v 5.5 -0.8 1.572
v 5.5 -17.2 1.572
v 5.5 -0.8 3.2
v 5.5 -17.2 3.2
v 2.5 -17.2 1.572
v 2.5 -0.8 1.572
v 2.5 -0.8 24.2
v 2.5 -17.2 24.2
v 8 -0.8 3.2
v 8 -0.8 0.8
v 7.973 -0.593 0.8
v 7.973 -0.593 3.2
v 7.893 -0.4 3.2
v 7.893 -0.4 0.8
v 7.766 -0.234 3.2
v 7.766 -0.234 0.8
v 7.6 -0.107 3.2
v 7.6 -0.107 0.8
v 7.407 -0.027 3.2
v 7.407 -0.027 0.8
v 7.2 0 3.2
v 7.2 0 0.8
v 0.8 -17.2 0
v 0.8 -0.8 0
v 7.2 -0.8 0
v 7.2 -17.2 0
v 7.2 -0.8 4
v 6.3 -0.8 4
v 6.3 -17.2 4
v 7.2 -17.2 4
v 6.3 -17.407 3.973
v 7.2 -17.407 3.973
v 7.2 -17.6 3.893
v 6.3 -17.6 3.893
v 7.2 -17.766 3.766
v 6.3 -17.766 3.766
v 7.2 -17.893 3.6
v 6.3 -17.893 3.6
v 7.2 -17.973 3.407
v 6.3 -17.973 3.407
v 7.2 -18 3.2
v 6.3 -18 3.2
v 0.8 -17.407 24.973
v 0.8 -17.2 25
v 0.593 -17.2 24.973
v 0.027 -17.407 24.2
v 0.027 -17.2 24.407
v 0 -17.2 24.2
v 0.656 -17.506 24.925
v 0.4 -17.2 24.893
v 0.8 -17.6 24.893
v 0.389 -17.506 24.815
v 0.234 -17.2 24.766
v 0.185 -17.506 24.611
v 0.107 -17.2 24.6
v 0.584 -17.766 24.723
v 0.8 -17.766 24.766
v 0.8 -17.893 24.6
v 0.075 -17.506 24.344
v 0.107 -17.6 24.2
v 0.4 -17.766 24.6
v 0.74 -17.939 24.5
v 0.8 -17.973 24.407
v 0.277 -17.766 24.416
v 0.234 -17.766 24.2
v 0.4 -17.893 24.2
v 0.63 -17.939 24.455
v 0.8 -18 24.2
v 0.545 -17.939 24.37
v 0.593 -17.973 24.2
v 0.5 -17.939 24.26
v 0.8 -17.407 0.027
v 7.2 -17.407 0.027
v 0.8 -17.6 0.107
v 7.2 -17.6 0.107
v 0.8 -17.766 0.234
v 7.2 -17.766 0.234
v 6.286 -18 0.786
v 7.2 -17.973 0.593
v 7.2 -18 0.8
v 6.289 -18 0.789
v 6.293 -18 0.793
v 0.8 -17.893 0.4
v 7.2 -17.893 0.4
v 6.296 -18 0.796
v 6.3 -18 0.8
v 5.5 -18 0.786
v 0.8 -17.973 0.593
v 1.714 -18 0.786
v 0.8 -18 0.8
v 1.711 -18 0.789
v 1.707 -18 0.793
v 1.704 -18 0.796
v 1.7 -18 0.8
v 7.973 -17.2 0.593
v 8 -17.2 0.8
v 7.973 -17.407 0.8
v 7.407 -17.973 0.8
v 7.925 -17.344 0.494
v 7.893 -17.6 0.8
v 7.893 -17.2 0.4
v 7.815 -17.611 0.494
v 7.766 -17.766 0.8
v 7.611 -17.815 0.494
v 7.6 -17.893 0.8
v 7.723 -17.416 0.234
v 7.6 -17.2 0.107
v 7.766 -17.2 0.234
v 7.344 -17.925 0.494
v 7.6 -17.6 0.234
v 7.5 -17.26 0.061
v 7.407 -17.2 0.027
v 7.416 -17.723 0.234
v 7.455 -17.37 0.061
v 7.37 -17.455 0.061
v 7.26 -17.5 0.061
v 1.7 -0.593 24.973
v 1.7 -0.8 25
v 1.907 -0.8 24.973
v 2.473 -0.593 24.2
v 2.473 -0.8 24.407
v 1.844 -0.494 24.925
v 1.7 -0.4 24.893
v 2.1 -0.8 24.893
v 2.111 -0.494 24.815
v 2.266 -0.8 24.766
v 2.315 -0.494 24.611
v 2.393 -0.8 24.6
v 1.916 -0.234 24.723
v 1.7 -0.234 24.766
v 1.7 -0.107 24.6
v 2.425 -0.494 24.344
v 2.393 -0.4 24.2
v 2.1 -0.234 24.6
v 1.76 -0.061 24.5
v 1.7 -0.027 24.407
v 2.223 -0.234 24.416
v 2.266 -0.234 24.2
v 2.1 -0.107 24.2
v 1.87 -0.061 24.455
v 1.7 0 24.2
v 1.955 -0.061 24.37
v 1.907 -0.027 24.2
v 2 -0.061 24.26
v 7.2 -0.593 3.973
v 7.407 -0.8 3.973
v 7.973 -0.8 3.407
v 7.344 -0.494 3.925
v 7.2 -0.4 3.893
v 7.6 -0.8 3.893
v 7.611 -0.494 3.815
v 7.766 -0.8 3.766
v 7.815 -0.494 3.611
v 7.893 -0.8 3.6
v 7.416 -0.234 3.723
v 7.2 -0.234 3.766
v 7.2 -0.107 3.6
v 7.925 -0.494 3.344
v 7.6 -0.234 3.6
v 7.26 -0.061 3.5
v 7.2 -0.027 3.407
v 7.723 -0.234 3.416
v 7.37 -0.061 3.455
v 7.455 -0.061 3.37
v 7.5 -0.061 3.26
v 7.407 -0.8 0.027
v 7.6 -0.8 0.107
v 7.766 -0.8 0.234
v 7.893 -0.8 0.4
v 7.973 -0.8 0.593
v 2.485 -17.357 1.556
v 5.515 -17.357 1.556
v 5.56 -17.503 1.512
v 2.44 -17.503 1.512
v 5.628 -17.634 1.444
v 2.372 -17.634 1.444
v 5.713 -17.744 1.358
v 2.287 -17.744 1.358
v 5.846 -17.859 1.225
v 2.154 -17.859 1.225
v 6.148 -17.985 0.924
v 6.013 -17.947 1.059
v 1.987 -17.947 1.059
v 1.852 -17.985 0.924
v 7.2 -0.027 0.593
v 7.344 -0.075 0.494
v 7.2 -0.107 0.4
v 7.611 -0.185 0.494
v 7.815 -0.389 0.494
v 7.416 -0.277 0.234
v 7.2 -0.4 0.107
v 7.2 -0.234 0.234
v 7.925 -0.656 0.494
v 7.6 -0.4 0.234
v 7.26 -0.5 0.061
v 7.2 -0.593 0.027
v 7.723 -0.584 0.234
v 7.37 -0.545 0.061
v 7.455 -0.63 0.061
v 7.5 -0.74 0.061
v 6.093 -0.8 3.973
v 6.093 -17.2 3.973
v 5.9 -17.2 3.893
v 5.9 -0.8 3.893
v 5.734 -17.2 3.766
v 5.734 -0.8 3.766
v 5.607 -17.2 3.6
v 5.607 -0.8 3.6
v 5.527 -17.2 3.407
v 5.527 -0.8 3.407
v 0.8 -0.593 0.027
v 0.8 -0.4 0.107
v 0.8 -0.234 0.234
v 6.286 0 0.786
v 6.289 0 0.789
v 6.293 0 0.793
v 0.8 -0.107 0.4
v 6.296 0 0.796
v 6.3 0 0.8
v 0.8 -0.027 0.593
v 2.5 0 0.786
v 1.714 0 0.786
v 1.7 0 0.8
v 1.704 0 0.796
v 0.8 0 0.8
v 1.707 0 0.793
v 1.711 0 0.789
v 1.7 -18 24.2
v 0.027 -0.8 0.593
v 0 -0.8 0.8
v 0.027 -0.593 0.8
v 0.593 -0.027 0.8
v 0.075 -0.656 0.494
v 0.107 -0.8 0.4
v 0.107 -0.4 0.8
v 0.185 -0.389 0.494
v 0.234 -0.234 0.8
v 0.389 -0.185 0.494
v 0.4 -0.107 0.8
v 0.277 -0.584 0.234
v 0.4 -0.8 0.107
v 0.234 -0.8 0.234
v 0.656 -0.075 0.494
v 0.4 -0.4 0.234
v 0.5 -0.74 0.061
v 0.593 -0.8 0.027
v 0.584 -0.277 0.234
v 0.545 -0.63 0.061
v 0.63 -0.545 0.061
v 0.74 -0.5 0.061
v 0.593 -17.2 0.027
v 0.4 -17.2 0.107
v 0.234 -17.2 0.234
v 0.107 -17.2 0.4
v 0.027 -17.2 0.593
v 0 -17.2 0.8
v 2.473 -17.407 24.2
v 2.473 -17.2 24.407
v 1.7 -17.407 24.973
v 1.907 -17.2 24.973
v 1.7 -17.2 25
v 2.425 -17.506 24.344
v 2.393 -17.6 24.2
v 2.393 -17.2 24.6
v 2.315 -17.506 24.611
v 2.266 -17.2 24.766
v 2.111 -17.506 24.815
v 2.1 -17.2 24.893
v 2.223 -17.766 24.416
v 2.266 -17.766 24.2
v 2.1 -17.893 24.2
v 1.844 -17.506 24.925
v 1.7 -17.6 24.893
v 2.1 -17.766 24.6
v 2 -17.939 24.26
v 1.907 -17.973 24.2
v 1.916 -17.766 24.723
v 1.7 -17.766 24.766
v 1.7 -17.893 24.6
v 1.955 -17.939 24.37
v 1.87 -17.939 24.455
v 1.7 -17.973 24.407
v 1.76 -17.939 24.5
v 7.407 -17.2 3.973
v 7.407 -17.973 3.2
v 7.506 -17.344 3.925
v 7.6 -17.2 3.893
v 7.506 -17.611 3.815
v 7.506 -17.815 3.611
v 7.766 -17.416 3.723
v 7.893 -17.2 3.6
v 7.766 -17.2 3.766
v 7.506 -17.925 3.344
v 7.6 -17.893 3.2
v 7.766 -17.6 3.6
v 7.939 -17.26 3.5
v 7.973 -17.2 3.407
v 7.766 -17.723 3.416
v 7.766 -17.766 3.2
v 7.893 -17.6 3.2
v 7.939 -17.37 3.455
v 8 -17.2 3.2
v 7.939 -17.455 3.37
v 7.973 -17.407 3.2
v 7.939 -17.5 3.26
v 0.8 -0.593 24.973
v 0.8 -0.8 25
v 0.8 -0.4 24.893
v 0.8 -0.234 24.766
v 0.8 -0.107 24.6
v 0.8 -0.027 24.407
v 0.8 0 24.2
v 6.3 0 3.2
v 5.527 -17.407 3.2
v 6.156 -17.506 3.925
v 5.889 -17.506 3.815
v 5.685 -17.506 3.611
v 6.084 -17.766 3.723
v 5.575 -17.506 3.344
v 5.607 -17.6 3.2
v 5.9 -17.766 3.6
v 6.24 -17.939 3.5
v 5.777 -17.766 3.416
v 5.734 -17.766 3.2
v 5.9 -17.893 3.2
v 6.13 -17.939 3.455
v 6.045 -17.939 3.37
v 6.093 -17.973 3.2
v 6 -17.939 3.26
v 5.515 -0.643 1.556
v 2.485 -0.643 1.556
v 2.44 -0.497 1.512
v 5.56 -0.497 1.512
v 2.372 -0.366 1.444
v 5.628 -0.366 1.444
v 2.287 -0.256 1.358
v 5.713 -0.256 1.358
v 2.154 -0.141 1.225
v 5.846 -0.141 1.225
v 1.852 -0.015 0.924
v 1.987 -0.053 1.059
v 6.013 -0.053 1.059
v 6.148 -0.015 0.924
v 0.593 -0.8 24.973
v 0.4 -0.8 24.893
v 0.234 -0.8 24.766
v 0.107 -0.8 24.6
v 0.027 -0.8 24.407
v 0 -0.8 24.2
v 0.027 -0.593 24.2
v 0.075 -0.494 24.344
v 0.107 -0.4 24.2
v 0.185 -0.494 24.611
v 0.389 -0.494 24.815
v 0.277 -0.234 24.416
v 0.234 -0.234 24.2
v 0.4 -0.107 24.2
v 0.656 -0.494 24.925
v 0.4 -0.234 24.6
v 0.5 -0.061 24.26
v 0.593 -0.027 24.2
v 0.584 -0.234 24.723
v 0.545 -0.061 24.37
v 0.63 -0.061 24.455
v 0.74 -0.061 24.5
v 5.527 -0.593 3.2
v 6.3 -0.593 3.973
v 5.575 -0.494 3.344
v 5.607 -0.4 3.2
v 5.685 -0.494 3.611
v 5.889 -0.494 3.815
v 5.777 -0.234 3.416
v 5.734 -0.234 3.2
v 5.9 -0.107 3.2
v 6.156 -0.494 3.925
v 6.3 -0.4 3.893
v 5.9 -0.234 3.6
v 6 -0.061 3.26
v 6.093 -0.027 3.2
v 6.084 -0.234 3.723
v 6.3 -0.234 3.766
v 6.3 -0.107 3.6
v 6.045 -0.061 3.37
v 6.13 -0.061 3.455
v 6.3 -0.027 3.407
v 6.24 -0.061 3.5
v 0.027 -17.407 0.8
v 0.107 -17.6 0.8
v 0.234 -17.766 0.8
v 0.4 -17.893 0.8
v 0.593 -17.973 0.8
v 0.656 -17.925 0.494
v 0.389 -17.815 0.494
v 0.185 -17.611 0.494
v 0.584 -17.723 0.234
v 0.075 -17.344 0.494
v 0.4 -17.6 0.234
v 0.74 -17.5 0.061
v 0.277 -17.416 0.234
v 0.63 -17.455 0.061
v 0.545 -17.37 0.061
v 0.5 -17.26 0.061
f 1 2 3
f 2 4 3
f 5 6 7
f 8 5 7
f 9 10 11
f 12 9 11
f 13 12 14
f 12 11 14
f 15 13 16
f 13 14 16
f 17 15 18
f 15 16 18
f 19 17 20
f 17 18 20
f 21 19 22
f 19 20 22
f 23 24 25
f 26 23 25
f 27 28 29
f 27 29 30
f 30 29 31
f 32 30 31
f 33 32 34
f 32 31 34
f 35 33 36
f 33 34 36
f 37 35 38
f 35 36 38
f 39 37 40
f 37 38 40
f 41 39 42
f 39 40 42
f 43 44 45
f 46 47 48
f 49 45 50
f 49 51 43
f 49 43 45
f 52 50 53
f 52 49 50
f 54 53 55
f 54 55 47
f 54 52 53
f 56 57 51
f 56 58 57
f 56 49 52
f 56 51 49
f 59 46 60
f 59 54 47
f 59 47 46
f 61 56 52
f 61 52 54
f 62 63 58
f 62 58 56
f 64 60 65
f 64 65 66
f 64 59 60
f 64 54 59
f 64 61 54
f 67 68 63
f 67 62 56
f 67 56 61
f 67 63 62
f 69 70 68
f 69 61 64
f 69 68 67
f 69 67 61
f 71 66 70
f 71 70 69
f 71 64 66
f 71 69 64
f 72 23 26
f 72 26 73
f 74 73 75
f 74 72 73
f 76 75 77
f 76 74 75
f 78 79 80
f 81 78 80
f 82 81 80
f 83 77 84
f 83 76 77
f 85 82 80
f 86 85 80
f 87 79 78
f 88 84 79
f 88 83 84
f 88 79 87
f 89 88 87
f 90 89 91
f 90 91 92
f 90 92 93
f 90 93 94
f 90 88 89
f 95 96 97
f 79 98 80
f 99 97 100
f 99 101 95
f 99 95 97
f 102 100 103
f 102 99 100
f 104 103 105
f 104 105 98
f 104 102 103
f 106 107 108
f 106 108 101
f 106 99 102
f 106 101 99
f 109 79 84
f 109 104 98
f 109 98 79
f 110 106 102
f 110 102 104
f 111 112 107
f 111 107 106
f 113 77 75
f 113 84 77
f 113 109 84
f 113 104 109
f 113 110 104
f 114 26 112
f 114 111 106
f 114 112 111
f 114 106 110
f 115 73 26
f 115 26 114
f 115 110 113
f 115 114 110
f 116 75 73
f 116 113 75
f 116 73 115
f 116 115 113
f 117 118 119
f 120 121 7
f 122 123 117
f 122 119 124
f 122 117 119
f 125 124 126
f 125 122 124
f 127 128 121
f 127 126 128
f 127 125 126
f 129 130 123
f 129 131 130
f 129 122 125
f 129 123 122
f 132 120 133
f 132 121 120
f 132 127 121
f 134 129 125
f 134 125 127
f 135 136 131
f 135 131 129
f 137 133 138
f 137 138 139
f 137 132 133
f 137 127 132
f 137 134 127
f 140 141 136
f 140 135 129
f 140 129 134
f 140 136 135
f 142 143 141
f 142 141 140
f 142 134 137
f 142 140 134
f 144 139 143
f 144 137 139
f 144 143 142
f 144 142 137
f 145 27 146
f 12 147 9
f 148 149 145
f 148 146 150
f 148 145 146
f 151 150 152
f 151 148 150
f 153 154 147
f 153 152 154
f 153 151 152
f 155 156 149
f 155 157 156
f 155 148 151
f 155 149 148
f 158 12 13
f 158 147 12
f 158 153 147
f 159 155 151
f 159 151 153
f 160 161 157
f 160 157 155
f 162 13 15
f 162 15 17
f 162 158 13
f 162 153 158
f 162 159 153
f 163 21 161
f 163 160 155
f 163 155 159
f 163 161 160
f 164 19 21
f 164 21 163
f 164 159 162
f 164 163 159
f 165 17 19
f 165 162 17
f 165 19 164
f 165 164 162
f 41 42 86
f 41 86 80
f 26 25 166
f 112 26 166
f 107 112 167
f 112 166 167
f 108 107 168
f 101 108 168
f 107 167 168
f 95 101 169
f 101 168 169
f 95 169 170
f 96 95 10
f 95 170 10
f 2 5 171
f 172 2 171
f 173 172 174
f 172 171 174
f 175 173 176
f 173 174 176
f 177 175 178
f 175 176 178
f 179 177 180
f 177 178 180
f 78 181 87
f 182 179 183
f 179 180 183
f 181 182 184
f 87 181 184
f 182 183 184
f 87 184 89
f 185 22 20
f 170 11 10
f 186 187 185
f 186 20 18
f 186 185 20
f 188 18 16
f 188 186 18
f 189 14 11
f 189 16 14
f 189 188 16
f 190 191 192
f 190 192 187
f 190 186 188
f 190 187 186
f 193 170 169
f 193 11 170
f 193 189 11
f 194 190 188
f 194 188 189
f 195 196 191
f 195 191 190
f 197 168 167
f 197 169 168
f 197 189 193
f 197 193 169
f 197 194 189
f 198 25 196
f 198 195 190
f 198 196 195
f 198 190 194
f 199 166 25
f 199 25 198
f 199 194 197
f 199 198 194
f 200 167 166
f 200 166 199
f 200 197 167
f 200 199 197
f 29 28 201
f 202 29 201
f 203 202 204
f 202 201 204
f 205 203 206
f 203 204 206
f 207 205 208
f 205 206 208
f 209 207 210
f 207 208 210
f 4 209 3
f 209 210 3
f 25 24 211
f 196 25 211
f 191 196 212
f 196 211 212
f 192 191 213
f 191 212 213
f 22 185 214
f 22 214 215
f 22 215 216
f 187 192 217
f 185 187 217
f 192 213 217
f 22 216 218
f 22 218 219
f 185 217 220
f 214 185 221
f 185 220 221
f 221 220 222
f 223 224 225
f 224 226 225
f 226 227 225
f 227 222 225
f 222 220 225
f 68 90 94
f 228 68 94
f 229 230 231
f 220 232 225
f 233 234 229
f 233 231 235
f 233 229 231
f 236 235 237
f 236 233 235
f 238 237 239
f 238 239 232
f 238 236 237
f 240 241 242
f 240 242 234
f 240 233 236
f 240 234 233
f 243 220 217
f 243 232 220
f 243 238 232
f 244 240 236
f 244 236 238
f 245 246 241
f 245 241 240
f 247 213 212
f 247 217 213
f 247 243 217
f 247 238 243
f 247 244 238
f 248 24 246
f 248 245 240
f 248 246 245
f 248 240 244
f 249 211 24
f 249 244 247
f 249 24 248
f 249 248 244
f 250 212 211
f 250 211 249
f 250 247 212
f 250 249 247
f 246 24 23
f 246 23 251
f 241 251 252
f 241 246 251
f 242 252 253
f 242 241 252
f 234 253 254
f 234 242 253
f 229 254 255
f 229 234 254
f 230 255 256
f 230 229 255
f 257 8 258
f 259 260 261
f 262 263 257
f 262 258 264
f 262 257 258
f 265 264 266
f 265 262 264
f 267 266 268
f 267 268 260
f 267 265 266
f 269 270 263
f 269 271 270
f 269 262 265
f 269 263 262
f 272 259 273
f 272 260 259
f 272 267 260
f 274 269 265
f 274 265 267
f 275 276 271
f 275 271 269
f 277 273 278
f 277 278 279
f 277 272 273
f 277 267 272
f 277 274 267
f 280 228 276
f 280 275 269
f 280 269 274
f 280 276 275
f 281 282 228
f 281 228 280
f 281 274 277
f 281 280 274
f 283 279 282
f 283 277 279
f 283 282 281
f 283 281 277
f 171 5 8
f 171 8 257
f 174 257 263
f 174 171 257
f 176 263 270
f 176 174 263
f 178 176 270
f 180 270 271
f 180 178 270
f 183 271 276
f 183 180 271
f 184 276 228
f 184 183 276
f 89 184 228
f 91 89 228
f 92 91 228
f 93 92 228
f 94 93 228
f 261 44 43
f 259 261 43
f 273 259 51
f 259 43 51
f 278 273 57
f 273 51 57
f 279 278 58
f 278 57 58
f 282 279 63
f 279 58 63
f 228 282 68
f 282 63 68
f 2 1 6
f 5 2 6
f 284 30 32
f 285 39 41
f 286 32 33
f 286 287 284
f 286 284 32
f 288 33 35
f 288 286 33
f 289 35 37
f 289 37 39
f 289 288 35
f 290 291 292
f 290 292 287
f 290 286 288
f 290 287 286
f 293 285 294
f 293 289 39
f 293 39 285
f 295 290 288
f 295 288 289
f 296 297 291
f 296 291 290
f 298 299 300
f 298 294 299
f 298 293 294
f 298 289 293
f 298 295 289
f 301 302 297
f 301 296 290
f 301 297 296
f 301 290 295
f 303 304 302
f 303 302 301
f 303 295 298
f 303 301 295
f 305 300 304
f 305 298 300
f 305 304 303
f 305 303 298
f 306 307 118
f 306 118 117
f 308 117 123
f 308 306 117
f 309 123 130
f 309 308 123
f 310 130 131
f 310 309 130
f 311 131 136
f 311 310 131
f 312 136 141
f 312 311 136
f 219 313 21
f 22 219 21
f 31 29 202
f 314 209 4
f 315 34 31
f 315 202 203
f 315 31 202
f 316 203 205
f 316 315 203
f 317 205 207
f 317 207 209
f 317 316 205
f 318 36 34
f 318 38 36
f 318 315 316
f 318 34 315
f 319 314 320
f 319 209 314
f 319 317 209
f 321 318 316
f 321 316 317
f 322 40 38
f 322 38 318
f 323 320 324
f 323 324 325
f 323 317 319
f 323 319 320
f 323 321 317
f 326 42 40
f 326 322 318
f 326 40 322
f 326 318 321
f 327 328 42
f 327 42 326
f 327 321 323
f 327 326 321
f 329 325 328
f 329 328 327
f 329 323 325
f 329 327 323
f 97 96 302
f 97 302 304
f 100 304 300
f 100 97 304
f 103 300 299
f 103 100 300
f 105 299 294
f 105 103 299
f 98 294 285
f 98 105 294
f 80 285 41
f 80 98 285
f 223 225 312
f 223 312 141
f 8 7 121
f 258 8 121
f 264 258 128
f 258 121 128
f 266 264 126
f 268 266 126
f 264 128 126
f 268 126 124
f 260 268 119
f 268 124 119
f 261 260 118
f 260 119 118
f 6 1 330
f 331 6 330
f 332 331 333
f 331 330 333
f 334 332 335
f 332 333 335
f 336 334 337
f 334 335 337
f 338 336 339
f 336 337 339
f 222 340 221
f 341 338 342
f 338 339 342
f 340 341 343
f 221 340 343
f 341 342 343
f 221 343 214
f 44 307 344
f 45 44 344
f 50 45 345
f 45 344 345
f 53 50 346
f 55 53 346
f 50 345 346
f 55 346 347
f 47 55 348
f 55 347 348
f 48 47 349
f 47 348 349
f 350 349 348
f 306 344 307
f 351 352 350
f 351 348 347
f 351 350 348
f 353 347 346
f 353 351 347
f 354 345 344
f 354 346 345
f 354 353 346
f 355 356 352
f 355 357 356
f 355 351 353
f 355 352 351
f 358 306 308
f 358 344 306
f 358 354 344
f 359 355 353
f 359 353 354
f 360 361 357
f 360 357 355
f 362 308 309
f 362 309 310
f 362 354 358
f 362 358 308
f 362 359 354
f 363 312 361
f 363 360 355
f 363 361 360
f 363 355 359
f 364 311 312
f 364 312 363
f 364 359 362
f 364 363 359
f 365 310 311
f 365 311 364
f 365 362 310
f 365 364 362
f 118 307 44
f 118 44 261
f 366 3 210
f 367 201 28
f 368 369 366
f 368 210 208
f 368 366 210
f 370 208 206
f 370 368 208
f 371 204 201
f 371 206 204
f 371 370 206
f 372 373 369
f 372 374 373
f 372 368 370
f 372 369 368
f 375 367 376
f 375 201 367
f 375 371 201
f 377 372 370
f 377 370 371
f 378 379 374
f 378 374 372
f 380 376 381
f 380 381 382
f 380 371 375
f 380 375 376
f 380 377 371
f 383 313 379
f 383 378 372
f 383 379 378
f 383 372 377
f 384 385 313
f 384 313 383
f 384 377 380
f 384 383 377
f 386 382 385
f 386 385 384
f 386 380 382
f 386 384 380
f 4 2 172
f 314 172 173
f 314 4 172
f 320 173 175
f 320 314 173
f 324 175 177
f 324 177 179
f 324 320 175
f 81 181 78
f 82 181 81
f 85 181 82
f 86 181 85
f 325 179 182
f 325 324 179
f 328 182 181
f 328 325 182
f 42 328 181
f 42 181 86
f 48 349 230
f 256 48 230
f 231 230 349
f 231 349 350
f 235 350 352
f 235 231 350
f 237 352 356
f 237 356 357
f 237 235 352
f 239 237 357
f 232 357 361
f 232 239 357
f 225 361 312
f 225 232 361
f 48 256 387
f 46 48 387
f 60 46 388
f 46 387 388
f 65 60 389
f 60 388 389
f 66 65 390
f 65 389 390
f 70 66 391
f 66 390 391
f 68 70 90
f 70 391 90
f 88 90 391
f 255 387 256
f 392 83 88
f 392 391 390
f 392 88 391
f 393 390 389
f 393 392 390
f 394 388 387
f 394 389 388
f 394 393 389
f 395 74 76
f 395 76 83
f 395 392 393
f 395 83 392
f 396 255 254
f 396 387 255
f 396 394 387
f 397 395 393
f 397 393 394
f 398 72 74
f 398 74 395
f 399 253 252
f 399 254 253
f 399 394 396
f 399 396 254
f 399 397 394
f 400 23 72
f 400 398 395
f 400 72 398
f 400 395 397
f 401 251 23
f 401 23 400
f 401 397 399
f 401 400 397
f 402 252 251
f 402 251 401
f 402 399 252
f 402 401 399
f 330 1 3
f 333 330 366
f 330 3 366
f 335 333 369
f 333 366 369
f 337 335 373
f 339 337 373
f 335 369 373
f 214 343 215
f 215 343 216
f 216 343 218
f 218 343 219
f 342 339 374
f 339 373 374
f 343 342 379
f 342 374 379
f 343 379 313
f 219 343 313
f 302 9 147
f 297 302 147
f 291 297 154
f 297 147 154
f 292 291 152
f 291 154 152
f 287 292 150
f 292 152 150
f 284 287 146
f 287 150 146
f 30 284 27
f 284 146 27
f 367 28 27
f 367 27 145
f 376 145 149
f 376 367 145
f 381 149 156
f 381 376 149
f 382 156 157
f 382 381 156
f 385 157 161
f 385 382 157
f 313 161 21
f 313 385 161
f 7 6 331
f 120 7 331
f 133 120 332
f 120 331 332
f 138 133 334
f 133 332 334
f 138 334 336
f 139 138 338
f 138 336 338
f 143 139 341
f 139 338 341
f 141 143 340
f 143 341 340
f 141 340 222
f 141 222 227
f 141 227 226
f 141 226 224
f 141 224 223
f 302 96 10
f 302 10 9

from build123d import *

# Parameters (mm, degrees)
F0_W          = 2.5
F0_H          = 1.5716314532
F0_W_2        = 3
F0_H_2        = 23.4283685468
F0_H_3        = 2.4283685468
F1_DEPTH      = 18
F2_T1_DEPTH   = 16.4
F2_T3_DEPTH   = 22.6283685468
F2_T5_DEPTH   = 3
F2_T7_DEPTH   = 1.6283685468
F2_T9_DEPTH   = 0.9
F2_T11_DEPTH  = 2.4
F2_T13_DEPTH  = 6.4
F2_T15_DEPTH  = 23.4
F2_T17_DEPTH  = 0.9
F2_S21_W      = 0.8
F2_S21_H      = 0.8
F2_T22_DEPTH  = 0.8
F2_S27_W      = 0.8
F2_S27_H      = 0.8
F2_T28_DEPTH  = 0.8
F2_S33_W      = 0.8
F2_S33_H      = 0.8
F2_T34_DEPTH  = 0.8
F2_S39_W      = 0.8
F2_S39_H      = 0.8
F2_T40_DEPTH  = 0.8
F2_S45_W      = 0.8
F2_S45_H      = 0.8
F2_T46_DEPTH  = 0.8
F2_S51_W      = 0.8
F2_S51_H      = 0.8
F2_T52_DEPTH  = 0.8
F2_S57_W      = 0.8
F2_S57_H      = 0.8
F2_T58_DEPTH  = 0.8
F2_S63_W      = 0.8
F2_S63_H      = 0.8
F2_T64_DEPTH  = 0.8
F2_S69_W      = 0.8
F2_S69_H      = 0.8
F2_T70_DEPTH  = 0.8
F2_S75_W      = 0.8
F2_S75_H      = 0.8
F2_T76_DEPTH  = 0.8
F2_S81_W      = 0.8
F2_S81_H      = 0.8
F2_T82_DEPTH  = 0.8
F2_S87_W      = 0.8
F2_S87_H      = 0.8
F2_T88_DEPTH  = 0.8
F2_T95_DEPTH  = 5
F2_T99_DEPTH  = 24.6283685468
F2_T106_DEPTH = 3.6283685468
F2_T110_DEPTH = 5
F2_T117_DEPTH = 3.6283685468
F2_T121_DEPTH = 5
F2_T128_DEPTH = 5
F2_T132_DEPTH = 24.6283685468


# Not quite as in the source:
# - a fillet or chamfer that OpenCascade refuses, or shapes differently, is made with other operations: its cross-section is extruded or revolved along the edge and cut away or added


with BuildPart() as f1:
    # F0 (on Front) → F1 (new body)
    with BuildSketch(Plane.XZ):
        with Locations((1.25, 0.7858157266)):
            Rectangle(F0_W, F0_H)
        with Locations((4, 0.7858157266)):
            Rectangle(F0_W_2, F0_H)
        with Locations((1.25, 13.2858157266)):
            Rectangle(F0_W, F0_H_2)
        with Locations((6.75, 0.7858157266)):
            Rectangle(F0_W, F0_H)
        with Locations((6.75, 2.7858157266)):
            Rectangle(F0_W, F0_H_3)
    extrude(amount=F1_DEPTH)

    # F2: fillet of radius 0.8 on 22 edges, made by hand

    # F2_s2 → F2_t1 (cut)
    with BuildSketch(Plane.XZ.offset(0.8)):
        with BuildLine():
            ThreePointArc((8, 3.2), (7.7656854249, 3.7656854249), (7.2, 4))
            Line((7.2, 4), (8, 4))
            Line((8, 4), (8, 3.2))
        make_face()
        with BuildLine():
            ThreePointArc((7.2, 0), (7.7656854249, 0.2343145751), (8, 0.8))
            Line((8, 0.8), (8, 0))
            Line((8, 0), (7.2, 0))
        make_face()
        with BuildLine():
            ThreePointArc((6.3, 4), (5.7343145751, 3.7656854249), (5.5, 3.2))
            Line((5.5, 3.2), (5.5, 4))
            Line((5.5, 4), (6.3, 4))
        make_face()
        with BuildLine():
            ThreePointArc((2.5, 24.2), (2.2656854249, 24.7656854249), (1.7, 25))
            Line((1.7, 25), (2.5, 25))
            Line((2.5, 25), (2.5, 24.2))
        make_face()
        with BuildLine():
            ThreePointArc((0.8, 25), (0.2343145751, 24.7656854249), (0, 24.2))
            Line((0, 24.2), (0, 25))
            Line((0, 25), (0.8, 25))
        make_face()
        with BuildLine():
            ThreePointArc((0.8, 0), (0.2343145751, 0.2343145751), (0, 0.8))
            Line((0, 0.8), (0, 0))
            Line((0, 0), (0.8, 0))
        make_face()
    extrude(amount=F2_T1_DEPTH, mode=Mode.SUBTRACT)

    # F2_s4 → F2_t3 (cut)
    with BuildSketch(Plane.XY.offset(1.5716314532)):
        with BuildLine():
            ThreePointArc((2.5, -17.2), (2.2656854249, -17.7656854249), (1.7, -18))
            Line((1.7, -18), (2.5, -18))
            Line((2.5, -18), (2.5, -17.2))
        make_face()
        with BuildLine():
            ThreePointArc((2.5, -0.8), (2.2656854249, -0.2343145751), (1.7, 0))
            Line((1.7, 0), (2.5, 0))
            Line((2.5, 0), (2.5, -0.8))
        make_face()
    extrude(amount=F2_T3_DEPTH, mode=Mode.SUBTRACT)

    # F2_s6 → F2_t5 (cut)
    with BuildSketch(Plane.YZ.offset(2.5)):
        with BuildLine():
            ThreePointArc((-17.2, 1.5716314532), (-17.7656854249, 1.3373168782), (-18, 0.7716314532))
            Line((-18, 0.7716314532), (-18, 1.5716314532))
            Line((-18, 1.5716314532), (-17.2, 1.5716314532))
        make_face()
        with BuildLine():
            ThreePointArc((-0.8, 1.5716314532), (-0.2343145751, 1.3373168782), (0, 0.7716314532))
            Line((0, 0.7716314532), (0, 1.5716314532))
            Line((0, 1.5716314532), (-0.8, 1.5716314532))
        make_face()
    extrude(amount=F2_T5_DEPTH, mode=Mode.SUBTRACT)

    # F2_s8 → F2_t7 (cut)
    with BuildSketch(Plane.XY.offset(1.5716314532)):
        with BuildLine():
            ThreePointArc((5.5, -17.2), (5.7343145751, -17.7656854249), (6.3, -18))
            Line((6.3, -18), (5.5, -18))
            Line((5.5, -18), (5.5, -17.2))
        make_face()
        with BuildLine():
            ThreePointArc((5.5, -0.8), (5.7343145751, -0.2343145751), (6.3, 0))
            Line((6.3, 0), (5.5, 0))
            Line((5.5, 0), (5.5, -0.8))
        make_face()
    extrude(amount=F2_T7_DEPTH, mode=Mode.SUBTRACT)

    # F2_s10 → F2_t9 (cut)
    with BuildSketch(Plane.YZ.offset(6.3)):
        with BuildLine():
            ThreePointArc((-17.2, 4), (-17.7656854249, 3.7656854249), (-18, 3.2))
            Line((-18, 3.2), (-18, 4))
            Line((-18, 4), (-17.2, 4))
        make_face()
        with BuildLine():
            ThreePointArc((-0.8, 4), (-0.2343145751, 3.7656854249), (0, 3.2))
            Line((0, 3.2), (0, 4))
            Line((0, 4), (-0.8, 4))
        make_face()
    extrude(amount=F2_T9_DEPTH, mode=Mode.SUBTRACT)

    # F2_s12 → F2_t11 (cut)
    with BuildSketch(Plane.XY.offset(0.8)):
        with BuildLine():
            ThreePointArc((8, -17.2), (7.7656854249, -17.7656854249), (7.2, -18))
            Line((7.2, -18), (8, -18))
            Line((8, -18), (8, -17.2))
        make_face()
        with BuildLine():
            ThreePointArc((8, -0.8), (7.7656854249, -0.2343145751), (7.2, 0))
            Line((7.2, 0), (8, 0))
            Line((8, 0), (8, -0.8))
        make_face()
    extrude(amount=F2_T11_DEPTH, mode=Mode.SUBTRACT)

    # F2_s14 → F2_t13 (cut)
    with BuildSketch(Plane.YZ.offset(0.8)):
        with BuildLine():
            ThreePointArc((-17.2, 0), (-17.7656854249, 0.2343145751), (-18, 0.8))
            Line((-18, 0.8), (-18, 0))
            Line((-18, 0), (-17.2, 0))
        make_face()
        with BuildLine():
            ThreePointArc((-0.8, 0), (-0.2343145751, 0.2343145751), (0, 0.8))
            Line((0, 0.8), (0, 0))
            Line((0, 0), (-0.8, 0))
        make_face()
    extrude(amount=F2_T13_DEPTH, mode=Mode.SUBTRACT)

    # F2_s16 → F2_t15 (cut)
    with BuildSketch(Plane.XY.offset(0.8)):
        with BuildLine():
            ThreePointArc((0, -17.2), (0.2343145751, -17.7656854249), (0.8, -18))
            Line((0.8, -18), (0, -18))
            Line((0, -18), (0, -17.2))
        make_face()
        with BuildLine():
            ThreePointArc((0, -0.8), (0.2343145751, -0.2343145751), (0.8, 0))
            Line((0.8, 0), (0, 0))
            Line((0, 0), (0, -0.8))
        make_face()
    extrude(amount=F2_T15_DEPTH, mode=Mode.SUBTRACT)

    # F2_s18 → F2_t17 (cut)
    with BuildSketch(Plane.YZ.offset(0.8)):
        with BuildLine():
            ThreePointArc((-0.8, 25), (-0.2343145751, 24.7656854249), (0, 24.2))
            Line((0, 24.2), (0, 25))
            Line((0, 25), (-0.8, 25))
        make_face()
        with BuildLine():
            ThreePointArc((-17.2, 25), (-17.7656854249, 24.7656854249), (-18, 24.2))
            Line((-18, 24.2), (-18, 25))
            Line((-18, 25), (-17.2, 25))
        make_face()
    extrude(amount=F2_T17_DEPTH, mode=Mode.SUBTRACT)


with BuildPart() as f2_tool20:
    # F2_s21 → F2_t22 (new body)
    with BuildSketch(Plane.XZ.offset(0.8)):
        with Locations((7.6, 3.6)):
            Rectangle(F2_S21_W, F2_S21_H)
    extrude(amount=-F2_T22_DEPTH)

    # F2_s23 → F2_t24 (revolve, cut)
    with BuildSketch(Plane(origin=(7.2, -0.8, 3.2), x_dir=(-0.7071067812, 0, -0.7071067812), z_dir=(0.7071067812, 0, -0.7071067812))):
        with BuildLine():
            ThreePointArc((0, -0.8), (0.8, 0), (0, 0.8))
            Line((0, 0.8), (0, -0.8))
        make_face()
    revolve(axis=Axis((7.2, -0.8, 3.2), (0, 1, 0)), mode=Mode.SUBTRACT)


with BuildPart() as f1_1:
    add(f1.part)

    # F2_t19: cut F2_tool20
    add(f2_tool20.part, mode=Mode.SUBTRACT)


with BuildPart() as f2_tool26:
    # F2_s27 → F2_t28 (new body)
    with BuildSketch(Plane.YZ.offset(7.2)):
        with Locations((-17.6, 3.6)):
            Rectangle(F2_S27_W, F2_S27_H)
    extrude(amount=F2_T28_DEPTH)

    # F2_s29 → F2_t30 (revolve, cut)
    with BuildSketch(Plane(origin=(7.2, -17.2, 3.2), x_dir=(0, 0.7071067812, -0.7071067812), z_dir=(0, -0.7071067812, -0.7071067812))):
        with BuildLine():
            ThreePointArc((0, -0.8), (0.8, 0), (0, 0.8))
            Line((0, 0.8), (0, -0.8))
        make_face()
    revolve(axis=Axis((7.2, -17.2, 3.2), (1, 0, 0)), mode=Mode.SUBTRACT)


with BuildPart() as f1_2:
    add(f1_1.part)

    # F2_t25: cut F2_tool26
    add(f2_tool26.part, mode=Mode.SUBTRACT)


with BuildPart() as f2_tool32:
    # F2_s33 → F2_t34 (new body)
    with BuildSketch(Plane.XZ.offset(17.2)):
        with Locations((2.1, 24.6)):
            Rectangle(F2_S33_W, F2_S33_H)
    extrude(amount=F2_T34_DEPTH)

    # F2_s35 → F2_t36 (revolve, cut)
    with BuildSketch(Plane(origin=(1.7, -17.2, 24.2), x_dir=(-0.7071067812, 0, -0.7071067812), z_dir=(-0.7071067812, 0, 0.7071067812))):
        with BuildLine():
            ThreePointArc((0, -0.8), (0.8, 0), (0, 0.8))
            Line((0, 0.8), (0, -0.8))
        make_face()
    revolve(axis=Axis((1.7, -17.2, 24.2), (0, -1, 0)), mode=Mode.SUBTRACT)


with BuildPart() as f1_3:
    add(f1_2.part)

    # F2_t31: cut F2_tool32
    add(f2_tool32.part, mode=Mode.SUBTRACT)


with BuildPart() as f2_tool38:
    # F2_s39 → F2_t40 (new body)
    with BuildSketch(Plane.XZ.offset(17.2)):
        with Locations((5.9, 3.6)):
            Rectangle(F2_S39_W, F2_S39_H)
    extrude(amount=F2_T40_DEPTH)

    # F2_s41 → F2_t42 (revolve, cut)
    with BuildSketch(Plane(origin=(6.3, -17.2, 3.2), x_dir=(0.7071067812, 0, -0.7071067812), z_dir=(-0.7071067812, 0, -0.7071067812))):
        with BuildLine():
            ThreePointArc((0, -0.8), (0.8, 0), (0, 0.8))
            Line((0, 0.8), (0, -0.8))
        make_face()
    revolve(axis=Axis((6.3, -17.2, 3.2), (0, -1, 0)), mode=Mode.SUBTRACT)


with BuildPart() as f1_4:
    add(f1_3.part)

    # F2_t37: cut F2_tool38
    add(f2_tool38.part, mode=Mode.SUBTRACT)


with BuildPart() as f2_tool44:
    # F2_s45 → F2_t46 (new body)
    with BuildSketch(Plane.XY.offset(0.8)):
        with Locations((7.6, -17.6)):
            Rectangle(F2_S45_W, F2_S45_H)
    extrude(amount=-F2_T46_DEPTH)

    # F2_s47 → F2_t48 (revolve, cut)
    with BuildSketch(Plane(origin=(7.2, -17.2, 0.8), x_dir=(-0.7071067812, 0.7071067812, 0), z_dir=(-0.7071067812, -0.7071067812, 0))):
        with BuildLine():
            ThreePointArc((0, -0.8), (0.8, 0), (0, 0.8))
            Line((0, 0.8), (0, -0.8))
        make_face()
    revolve(axis=Axis((7.2, -17.2, 0.8), (0, 0, -1)), mode=Mode.SUBTRACT)


with BuildPart() as f1_5:
    add(f1_4.part)

    # F2_t43: cut F2_tool44
    add(f2_tool44.part, mode=Mode.SUBTRACT)


with BuildPart() as f2_tool50:
    # F2_s51 → F2_t52 (new body)
    with BuildSketch(Plane.XY.offset(0.8)):
        with Locations((0.4, -17.6)):
            Rectangle(F2_S51_W, F2_S51_H)
    extrude(amount=-F2_T52_DEPTH)

    # F2_s53 → F2_t54 (revolve, cut)
    with BuildSketch(Plane(origin=(0.8, -17.2, 0.8), x_dir=(0.7071067812, 0.7071067812, 0), z_dir=(-0.7071067812, 0.7071067812, 0))):
        with BuildLine():
            ThreePointArc((0, -0.8), (0.8, 0), (0, 0.8))
            Line((0, 0.8), (0, -0.8))
        make_face()
    revolve(axis=Axis((0.8, -17.2, 0.8), (0, 0, -1)), mode=Mode.SUBTRACT)


with BuildPart() as f1_6:
    add(f1_5.part)

    # F2_t49: cut F2_tool50
    add(f2_tool50.part, mode=Mode.SUBTRACT)


with BuildPart() as f2_tool56:
    # F2_s57 → F2_t58 (new body)
    with BuildSketch(Plane.XZ.offset(17.2)):
        with Locations((0.4, 24.6)):
            Rectangle(F2_S57_W, F2_S57_H)
    extrude(amount=F2_T58_DEPTH)

    # F2_s59 → F2_t60 (revolve, cut)
    with BuildSketch(Plane(origin=(0.8, -17.2, 24.2), x_dir=(0.7071067812, 0, -0.7071067812), z_dir=(-0.7071067812, 0, -0.7071067812))):
        with BuildLine():
            ThreePointArc((0, -0.8), (0.8, 0), (0, 0.8))
            Line((0, 0.8), (0, -0.8))
        make_face()
    revolve(axis=Axis((0.8, -17.2, 24.2), (0, -1, 0)), mode=Mode.SUBTRACT)


with BuildPart() as f1_7:
    add(f1_6.part)

    # F2_t55: cut F2_tool56
    add(f2_tool56.part, mode=Mode.SUBTRACT)


with BuildPart() as f2_tool62:
    # F2_s63 → F2_t64 (new body)
    with BuildSketch(Plane.XY.offset(0.8)):
        with Locations((7.6, -0.4)):
            Rectangle(F2_S63_W, F2_S63_H)
    extrude(amount=-F2_T64_DEPTH)

    # F2_s65 → F2_t66 (revolve, cut)
    with BuildSketch(Plane(origin=(7.2, -0.8, 0.8), x_dir=(-0.7071067812, -0.7071067812, 0), z_dir=(0.7071067812, -0.7071067812, 0))):
        with BuildLine():
            ThreePointArc((0, -0.8), (0.8, 0), (0, 0.8))
            Line((0, 0.8), (0, -0.8))
        make_face()
    revolve(axis=Axis((7.2, -0.8, 0.8), (0, 0, -1)), mode=Mode.SUBTRACT)


with BuildPart() as f1_8:
    add(f1_7.part)

    # F2_t61: cut F2_tool62
    add(f2_tool62.part, mode=Mode.SUBTRACT)


with BuildPart() as f2_tool68:
    # F2_s69 → F2_t70 (new body)
    with BuildSketch(Plane.XZ.offset(0.8)):
        with Locations((5.9, 3.6)):
            Rectangle(F2_S69_W, F2_S69_H)
    extrude(amount=-F2_T70_DEPTH)

    # F2_s71 → F2_t72 (revolve, cut)
    with BuildSketch(Plane(origin=(6.3, -0.8, 3.2), x_dir=(0.7071067812, 0, -0.7071067812), z_dir=(0.7071067812, 0, 0.7071067812))):
        with BuildLine():
            ThreePointArc((0, -0.8), (0.8, 0), (0, 0.8))
            Line((0, 0.8), (0, -0.8))
        make_face()
    revolve(axis=Axis((6.3, -0.8, 3.2), (0, 1, 0)), mode=Mode.SUBTRACT)


with BuildPart() as f1_9:
    add(f1_8.part)

    # F2_t67: cut F2_tool68
    add(f2_tool68.part, mode=Mode.SUBTRACT)


with BuildPart() as f2_tool74:
    # F2_s75 → F2_t76 (new body)
    with BuildSketch(Plane.XY.offset(0.8)):
        with Locations((0.4, -0.4)):
            Rectangle(F2_S75_W, F2_S75_H)
    extrude(amount=-F2_T76_DEPTH)

    # F2_s77 → F2_t78 (revolve, cut)
    with BuildSketch(Plane(origin=(0.8, -0.8, 0.8), x_dir=(0.7071067812, -0.7071067812, 0), z_dir=(0.7071067812, 0.7071067812, 0))):
        with BuildLine():
            ThreePointArc((0, -0.8), (0.8, 0), (0, 0.8))
            Line((0, 0.8), (0, -0.8))
        make_face()
    revolve(axis=Axis((0.8, -0.8, 0.8), (0, 0, -1)), mode=Mode.SUBTRACT)


with BuildPart() as f1_10:
    add(f1_9.part)

    # F2_t73: cut F2_tool74
    add(f2_tool74.part, mode=Mode.SUBTRACT)


with BuildPart() as f2_tool80:
    # F2_s81 → F2_t82 (new body)
    with BuildSketch(Plane.XZ.offset(0.8)):
        with Locations((2.1, 24.6)):
            Rectangle(F2_S81_W, F2_S81_H)
    extrude(amount=-F2_T82_DEPTH)

    # F2_s83 → F2_t84 (revolve, cut)
    with BuildSketch(Plane(origin=(1.7, -0.8, 24.2), x_dir=(-0.7071067812, 0, -0.7071067812), z_dir=(0.7071067812, 0, -0.7071067812))):
        with BuildLine():
            ThreePointArc((0, -0.8), (0.8, 0), (0, 0.8))
            Line((0, 0.8), (0, -0.8))
        make_face()
    revolve(axis=Axis((1.7, -0.8, 24.2), (0, 1, 0)), mode=Mode.SUBTRACT)


with BuildPart() as f1_11:
    add(f1_10.part)

    # F2_t79: cut F2_tool80
    add(f2_tool80.part, mode=Mode.SUBTRACT)


with BuildPart() as f2_tool86:
    # F2_s87 → F2_t88 (new body)
    with BuildSketch(Plane.XZ.offset(0.8)):
        with Locations((0.4, 24.6)):
            Rectangle(F2_S87_W, F2_S87_H)
    extrude(amount=-F2_T88_DEPTH)

    # F2_s89 → F2_t90 (revolve, cut)
    with BuildSketch(Plane(origin=(0.8, -0.8, 24.2), x_dir=(0.7071067812, 0, -0.7071067812), z_dir=(0.7071067812, 0, 0.7071067812))):
        with BuildLine():
            ThreePointArc((0, -0.8), (0.8, 0), (0, 0.8))
            Line((0, 0.8), (0, -0.8))
        make_face()
    revolve(axis=Axis((0.8, -0.8, 24.2), (0, 1, 0)), mode=Mode.SUBTRACT)


with BuildPart() as f1_12:
    add(f1_11.part)

    # F2_t85: cut F2_tool86
    add(f2_tool86.part, mode=Mode.SUBTRACT)


with BuildPart() as f2_tool93:
    # F2_s94 → F2_t95 (new body)
    with BuildSketch(Plane.YZ.offset(5.5)):
        with BuildLine():
            ThreePointArc((-17.2, 1.5716314532), (-17.7656854249, 1.3373168782), (-18, 0.7716314532))
            Line((-18, 0.7716314532), (-18, 1.5716314532))
            Line((-18, 1.5716314532), (-17.2, 1.5716314532))
        make_face()
    extrude(amount=-F2_T95_DEPTH)

    split(bisect_by=Plane.YZ.offset(2.5), keep=Keep.BOTTOM)


with BuildPart() as f2_tool97:
    # F2_s98 → F2_t99 (new body)
    with BuildSketch(Plane.XY.offset(-0.4283685468)):
        with BuildLine():
            ThreePointArc((2.5, -17.2), (2.2656854249, -17.7656854249), (1.7, -18))
            Line((1.7, -18), (2.5, -18))
            Line((2.5, -18), (2.5, -17.2))
        make_face()
    extrude(amount=F2_T99_DEPTH)

    split(bisect_by=Plane.XY.offset(1.5716314532), keep=Keep.BOTTOM)


with BuildPart() as f2_tool93_1:
    add(f2_tool93.part)

    # F2_t101: intersect F2_tool97
    add(f2_tool97.part, mode=Mode.INTERSECT)


with BuildPart() as f1_13:
    add(f1_12.part)

    # F2_t91: cut F2_tool93
    add(f2_tool93_1.part, mode=Mode.SUBTRACT)


with BuildPart() as f2_tool104:
    # F2_s105 → F2_t106 (new body)
    with BuildSketch(Plane.XY.offset(3.2)):
        with BuildLine():
            ThreePointArc((5.5, -17.2), (5.7343145751, -17.7656854249), (6.3, -18))
            Line((6.3, -18), (5.5, -18))
            Line((5.5, -18), (5.5, -17.2))
        make_face()
    extrude(amount=-F2_T106_DEPTH)

    split(bisect_by=Plane.XY.offset(1.5716314532), keep=Keep.BOTTOM)


with BuildPart() as f2_tool108:
    # F2_s109 → F2_t110 (new body)
    with BuildSketch(Plane.YZ.offset(7.5)):
        with BuildLine():
            ThreePointArc((-17.2, 1.5716314532), (-17.7656854249, 1.3373168782), (-18, 0.7716314532))
            Line((-18, 0.7716314532), (-18, 1.5716314532))
            Line((-18, 1.5716314532), (-17.2, 1.5716314532))
        make_face()
    extrude(amount=-F2_T110_DEPTH)

    split(bisect_by=Plane.YZ.offset(5.5), keep=Keep.TOP)


with BuildPart() as f2_tool104_1:
    add(f2_tool104.part)

    # F2_t112: intersect F2_tool108
    add(f2_tool108.part, mode=Mode.INTERSECT)


with BuildPart() as f1_14:
    add(f1_13.part)

    # F2_t102: cut F2_tool104
    add(f2_tool104_1.part, mode=Mode.SUBTRACT)


with BuildPart() as f2_tool115:
    # F2_s116 → F2_t117 (new body)
    with BuildSketch(Plane.XY.offset(3.2)):
        with BuildLine():
            ThreePointArc((5.5, -0.8), (5.7343145751, -0.2343145751), (6.3, 0))
            Line((6.3, 0), (5.5, 0))
            Line((5.5, 0), (5.5, -0.8))
        make_face()
    extrude(amount=-F2_T117_DEPTH)

    split(bisect_by=Plane.XY.offset(1.5716314532), keep=Keep.BOTTOM)


with BuildPart() as f2_tool119:
    # F2_s120 → F2_t121 (new body)
    with BuildSketch(Plane.YZ.offset(7.5)):
        with BuildLine():
            ThreePointArc((-0.8, 1.5716314532), (-0.2343145751, 1.3373168782), (0, 0.7716314532))
            Line((0, 0.7716314532), (0, 1.5716314532))
            Line((0, 1.5716314532), (-0.8, 1.5716314532))
        make_face()
    extrude(amount=-F2_T121_DEPTH)

    split(bisect_by=Plane.YZ.offset(5.5), keep=Keep.TOP)


with BuildPart() as f2_tool115_1:
    add(f2_tool115.part)

    # F2_t123: intersect F2_tool119
    add(f2_tool119.part, mode=Mode.INTERSECT)


with BuildPart() as f1_15:
    add(f1_14.part)

    # F2_t113: cut F2_tool115
    add(f2_tool115_1.part, mode=Mode.SUBTRACT)


with BuildPart() as f2_tool126:
    # F2_s127 → F2_t128 (new body)
    with BuildSketch(Plane.YZ.offset(5.5)):
        with BuildLine():
            ThreePointArc((-0.8, 1.5716314532), (-0.2343145751, 1.3373168782), (0, 0.7716314532))
            Line((0, 0.7716314532), (0, 1.5716314532))
            Line((0, 1.5716314532), (-0.8, 1.5716314532))
        make_face()
    extrude(amount=-F2_T128_DEPTH)

    split(bisect_by=Plane.YZ.offset(2.5), keep=Keep.BOTTOM)


with BuildPart() as f2_tool130:
    # F2_s131 → F2_t132 (new body)
    with BuildSketch(Plane.XY.offset(-0.4283685468)):
        with BuildLine():
            ThreePointArc((2.5, -0.8), (2.2656854249, -0.2343145751), (1.7, 0))
            Line((1.7, 0), (2.5, 0))
            Line((2.5, 0), (2.5, -0.8))
        make_face()
    extrude(amount=F2_T132_DEPTH)

    split(bisect_by=Plane.XY.offset(1.5716314532), keep=Keep.BOTTOM)


with BuildPart() as f2_tool126_1:
    add(f2_tool126.part)

    # F2_t134: intersect F2_tool130
    add(f2_tool130.part, mode=Mode.INTERSECT)


with BuildPart() as f1_16:
    add(f1_15.part)

    # F2_t124: cut F2_tool126
    add(f2_tool126_1.part, mode=Mode.SUBTRACT)


solid = f1_16.part
